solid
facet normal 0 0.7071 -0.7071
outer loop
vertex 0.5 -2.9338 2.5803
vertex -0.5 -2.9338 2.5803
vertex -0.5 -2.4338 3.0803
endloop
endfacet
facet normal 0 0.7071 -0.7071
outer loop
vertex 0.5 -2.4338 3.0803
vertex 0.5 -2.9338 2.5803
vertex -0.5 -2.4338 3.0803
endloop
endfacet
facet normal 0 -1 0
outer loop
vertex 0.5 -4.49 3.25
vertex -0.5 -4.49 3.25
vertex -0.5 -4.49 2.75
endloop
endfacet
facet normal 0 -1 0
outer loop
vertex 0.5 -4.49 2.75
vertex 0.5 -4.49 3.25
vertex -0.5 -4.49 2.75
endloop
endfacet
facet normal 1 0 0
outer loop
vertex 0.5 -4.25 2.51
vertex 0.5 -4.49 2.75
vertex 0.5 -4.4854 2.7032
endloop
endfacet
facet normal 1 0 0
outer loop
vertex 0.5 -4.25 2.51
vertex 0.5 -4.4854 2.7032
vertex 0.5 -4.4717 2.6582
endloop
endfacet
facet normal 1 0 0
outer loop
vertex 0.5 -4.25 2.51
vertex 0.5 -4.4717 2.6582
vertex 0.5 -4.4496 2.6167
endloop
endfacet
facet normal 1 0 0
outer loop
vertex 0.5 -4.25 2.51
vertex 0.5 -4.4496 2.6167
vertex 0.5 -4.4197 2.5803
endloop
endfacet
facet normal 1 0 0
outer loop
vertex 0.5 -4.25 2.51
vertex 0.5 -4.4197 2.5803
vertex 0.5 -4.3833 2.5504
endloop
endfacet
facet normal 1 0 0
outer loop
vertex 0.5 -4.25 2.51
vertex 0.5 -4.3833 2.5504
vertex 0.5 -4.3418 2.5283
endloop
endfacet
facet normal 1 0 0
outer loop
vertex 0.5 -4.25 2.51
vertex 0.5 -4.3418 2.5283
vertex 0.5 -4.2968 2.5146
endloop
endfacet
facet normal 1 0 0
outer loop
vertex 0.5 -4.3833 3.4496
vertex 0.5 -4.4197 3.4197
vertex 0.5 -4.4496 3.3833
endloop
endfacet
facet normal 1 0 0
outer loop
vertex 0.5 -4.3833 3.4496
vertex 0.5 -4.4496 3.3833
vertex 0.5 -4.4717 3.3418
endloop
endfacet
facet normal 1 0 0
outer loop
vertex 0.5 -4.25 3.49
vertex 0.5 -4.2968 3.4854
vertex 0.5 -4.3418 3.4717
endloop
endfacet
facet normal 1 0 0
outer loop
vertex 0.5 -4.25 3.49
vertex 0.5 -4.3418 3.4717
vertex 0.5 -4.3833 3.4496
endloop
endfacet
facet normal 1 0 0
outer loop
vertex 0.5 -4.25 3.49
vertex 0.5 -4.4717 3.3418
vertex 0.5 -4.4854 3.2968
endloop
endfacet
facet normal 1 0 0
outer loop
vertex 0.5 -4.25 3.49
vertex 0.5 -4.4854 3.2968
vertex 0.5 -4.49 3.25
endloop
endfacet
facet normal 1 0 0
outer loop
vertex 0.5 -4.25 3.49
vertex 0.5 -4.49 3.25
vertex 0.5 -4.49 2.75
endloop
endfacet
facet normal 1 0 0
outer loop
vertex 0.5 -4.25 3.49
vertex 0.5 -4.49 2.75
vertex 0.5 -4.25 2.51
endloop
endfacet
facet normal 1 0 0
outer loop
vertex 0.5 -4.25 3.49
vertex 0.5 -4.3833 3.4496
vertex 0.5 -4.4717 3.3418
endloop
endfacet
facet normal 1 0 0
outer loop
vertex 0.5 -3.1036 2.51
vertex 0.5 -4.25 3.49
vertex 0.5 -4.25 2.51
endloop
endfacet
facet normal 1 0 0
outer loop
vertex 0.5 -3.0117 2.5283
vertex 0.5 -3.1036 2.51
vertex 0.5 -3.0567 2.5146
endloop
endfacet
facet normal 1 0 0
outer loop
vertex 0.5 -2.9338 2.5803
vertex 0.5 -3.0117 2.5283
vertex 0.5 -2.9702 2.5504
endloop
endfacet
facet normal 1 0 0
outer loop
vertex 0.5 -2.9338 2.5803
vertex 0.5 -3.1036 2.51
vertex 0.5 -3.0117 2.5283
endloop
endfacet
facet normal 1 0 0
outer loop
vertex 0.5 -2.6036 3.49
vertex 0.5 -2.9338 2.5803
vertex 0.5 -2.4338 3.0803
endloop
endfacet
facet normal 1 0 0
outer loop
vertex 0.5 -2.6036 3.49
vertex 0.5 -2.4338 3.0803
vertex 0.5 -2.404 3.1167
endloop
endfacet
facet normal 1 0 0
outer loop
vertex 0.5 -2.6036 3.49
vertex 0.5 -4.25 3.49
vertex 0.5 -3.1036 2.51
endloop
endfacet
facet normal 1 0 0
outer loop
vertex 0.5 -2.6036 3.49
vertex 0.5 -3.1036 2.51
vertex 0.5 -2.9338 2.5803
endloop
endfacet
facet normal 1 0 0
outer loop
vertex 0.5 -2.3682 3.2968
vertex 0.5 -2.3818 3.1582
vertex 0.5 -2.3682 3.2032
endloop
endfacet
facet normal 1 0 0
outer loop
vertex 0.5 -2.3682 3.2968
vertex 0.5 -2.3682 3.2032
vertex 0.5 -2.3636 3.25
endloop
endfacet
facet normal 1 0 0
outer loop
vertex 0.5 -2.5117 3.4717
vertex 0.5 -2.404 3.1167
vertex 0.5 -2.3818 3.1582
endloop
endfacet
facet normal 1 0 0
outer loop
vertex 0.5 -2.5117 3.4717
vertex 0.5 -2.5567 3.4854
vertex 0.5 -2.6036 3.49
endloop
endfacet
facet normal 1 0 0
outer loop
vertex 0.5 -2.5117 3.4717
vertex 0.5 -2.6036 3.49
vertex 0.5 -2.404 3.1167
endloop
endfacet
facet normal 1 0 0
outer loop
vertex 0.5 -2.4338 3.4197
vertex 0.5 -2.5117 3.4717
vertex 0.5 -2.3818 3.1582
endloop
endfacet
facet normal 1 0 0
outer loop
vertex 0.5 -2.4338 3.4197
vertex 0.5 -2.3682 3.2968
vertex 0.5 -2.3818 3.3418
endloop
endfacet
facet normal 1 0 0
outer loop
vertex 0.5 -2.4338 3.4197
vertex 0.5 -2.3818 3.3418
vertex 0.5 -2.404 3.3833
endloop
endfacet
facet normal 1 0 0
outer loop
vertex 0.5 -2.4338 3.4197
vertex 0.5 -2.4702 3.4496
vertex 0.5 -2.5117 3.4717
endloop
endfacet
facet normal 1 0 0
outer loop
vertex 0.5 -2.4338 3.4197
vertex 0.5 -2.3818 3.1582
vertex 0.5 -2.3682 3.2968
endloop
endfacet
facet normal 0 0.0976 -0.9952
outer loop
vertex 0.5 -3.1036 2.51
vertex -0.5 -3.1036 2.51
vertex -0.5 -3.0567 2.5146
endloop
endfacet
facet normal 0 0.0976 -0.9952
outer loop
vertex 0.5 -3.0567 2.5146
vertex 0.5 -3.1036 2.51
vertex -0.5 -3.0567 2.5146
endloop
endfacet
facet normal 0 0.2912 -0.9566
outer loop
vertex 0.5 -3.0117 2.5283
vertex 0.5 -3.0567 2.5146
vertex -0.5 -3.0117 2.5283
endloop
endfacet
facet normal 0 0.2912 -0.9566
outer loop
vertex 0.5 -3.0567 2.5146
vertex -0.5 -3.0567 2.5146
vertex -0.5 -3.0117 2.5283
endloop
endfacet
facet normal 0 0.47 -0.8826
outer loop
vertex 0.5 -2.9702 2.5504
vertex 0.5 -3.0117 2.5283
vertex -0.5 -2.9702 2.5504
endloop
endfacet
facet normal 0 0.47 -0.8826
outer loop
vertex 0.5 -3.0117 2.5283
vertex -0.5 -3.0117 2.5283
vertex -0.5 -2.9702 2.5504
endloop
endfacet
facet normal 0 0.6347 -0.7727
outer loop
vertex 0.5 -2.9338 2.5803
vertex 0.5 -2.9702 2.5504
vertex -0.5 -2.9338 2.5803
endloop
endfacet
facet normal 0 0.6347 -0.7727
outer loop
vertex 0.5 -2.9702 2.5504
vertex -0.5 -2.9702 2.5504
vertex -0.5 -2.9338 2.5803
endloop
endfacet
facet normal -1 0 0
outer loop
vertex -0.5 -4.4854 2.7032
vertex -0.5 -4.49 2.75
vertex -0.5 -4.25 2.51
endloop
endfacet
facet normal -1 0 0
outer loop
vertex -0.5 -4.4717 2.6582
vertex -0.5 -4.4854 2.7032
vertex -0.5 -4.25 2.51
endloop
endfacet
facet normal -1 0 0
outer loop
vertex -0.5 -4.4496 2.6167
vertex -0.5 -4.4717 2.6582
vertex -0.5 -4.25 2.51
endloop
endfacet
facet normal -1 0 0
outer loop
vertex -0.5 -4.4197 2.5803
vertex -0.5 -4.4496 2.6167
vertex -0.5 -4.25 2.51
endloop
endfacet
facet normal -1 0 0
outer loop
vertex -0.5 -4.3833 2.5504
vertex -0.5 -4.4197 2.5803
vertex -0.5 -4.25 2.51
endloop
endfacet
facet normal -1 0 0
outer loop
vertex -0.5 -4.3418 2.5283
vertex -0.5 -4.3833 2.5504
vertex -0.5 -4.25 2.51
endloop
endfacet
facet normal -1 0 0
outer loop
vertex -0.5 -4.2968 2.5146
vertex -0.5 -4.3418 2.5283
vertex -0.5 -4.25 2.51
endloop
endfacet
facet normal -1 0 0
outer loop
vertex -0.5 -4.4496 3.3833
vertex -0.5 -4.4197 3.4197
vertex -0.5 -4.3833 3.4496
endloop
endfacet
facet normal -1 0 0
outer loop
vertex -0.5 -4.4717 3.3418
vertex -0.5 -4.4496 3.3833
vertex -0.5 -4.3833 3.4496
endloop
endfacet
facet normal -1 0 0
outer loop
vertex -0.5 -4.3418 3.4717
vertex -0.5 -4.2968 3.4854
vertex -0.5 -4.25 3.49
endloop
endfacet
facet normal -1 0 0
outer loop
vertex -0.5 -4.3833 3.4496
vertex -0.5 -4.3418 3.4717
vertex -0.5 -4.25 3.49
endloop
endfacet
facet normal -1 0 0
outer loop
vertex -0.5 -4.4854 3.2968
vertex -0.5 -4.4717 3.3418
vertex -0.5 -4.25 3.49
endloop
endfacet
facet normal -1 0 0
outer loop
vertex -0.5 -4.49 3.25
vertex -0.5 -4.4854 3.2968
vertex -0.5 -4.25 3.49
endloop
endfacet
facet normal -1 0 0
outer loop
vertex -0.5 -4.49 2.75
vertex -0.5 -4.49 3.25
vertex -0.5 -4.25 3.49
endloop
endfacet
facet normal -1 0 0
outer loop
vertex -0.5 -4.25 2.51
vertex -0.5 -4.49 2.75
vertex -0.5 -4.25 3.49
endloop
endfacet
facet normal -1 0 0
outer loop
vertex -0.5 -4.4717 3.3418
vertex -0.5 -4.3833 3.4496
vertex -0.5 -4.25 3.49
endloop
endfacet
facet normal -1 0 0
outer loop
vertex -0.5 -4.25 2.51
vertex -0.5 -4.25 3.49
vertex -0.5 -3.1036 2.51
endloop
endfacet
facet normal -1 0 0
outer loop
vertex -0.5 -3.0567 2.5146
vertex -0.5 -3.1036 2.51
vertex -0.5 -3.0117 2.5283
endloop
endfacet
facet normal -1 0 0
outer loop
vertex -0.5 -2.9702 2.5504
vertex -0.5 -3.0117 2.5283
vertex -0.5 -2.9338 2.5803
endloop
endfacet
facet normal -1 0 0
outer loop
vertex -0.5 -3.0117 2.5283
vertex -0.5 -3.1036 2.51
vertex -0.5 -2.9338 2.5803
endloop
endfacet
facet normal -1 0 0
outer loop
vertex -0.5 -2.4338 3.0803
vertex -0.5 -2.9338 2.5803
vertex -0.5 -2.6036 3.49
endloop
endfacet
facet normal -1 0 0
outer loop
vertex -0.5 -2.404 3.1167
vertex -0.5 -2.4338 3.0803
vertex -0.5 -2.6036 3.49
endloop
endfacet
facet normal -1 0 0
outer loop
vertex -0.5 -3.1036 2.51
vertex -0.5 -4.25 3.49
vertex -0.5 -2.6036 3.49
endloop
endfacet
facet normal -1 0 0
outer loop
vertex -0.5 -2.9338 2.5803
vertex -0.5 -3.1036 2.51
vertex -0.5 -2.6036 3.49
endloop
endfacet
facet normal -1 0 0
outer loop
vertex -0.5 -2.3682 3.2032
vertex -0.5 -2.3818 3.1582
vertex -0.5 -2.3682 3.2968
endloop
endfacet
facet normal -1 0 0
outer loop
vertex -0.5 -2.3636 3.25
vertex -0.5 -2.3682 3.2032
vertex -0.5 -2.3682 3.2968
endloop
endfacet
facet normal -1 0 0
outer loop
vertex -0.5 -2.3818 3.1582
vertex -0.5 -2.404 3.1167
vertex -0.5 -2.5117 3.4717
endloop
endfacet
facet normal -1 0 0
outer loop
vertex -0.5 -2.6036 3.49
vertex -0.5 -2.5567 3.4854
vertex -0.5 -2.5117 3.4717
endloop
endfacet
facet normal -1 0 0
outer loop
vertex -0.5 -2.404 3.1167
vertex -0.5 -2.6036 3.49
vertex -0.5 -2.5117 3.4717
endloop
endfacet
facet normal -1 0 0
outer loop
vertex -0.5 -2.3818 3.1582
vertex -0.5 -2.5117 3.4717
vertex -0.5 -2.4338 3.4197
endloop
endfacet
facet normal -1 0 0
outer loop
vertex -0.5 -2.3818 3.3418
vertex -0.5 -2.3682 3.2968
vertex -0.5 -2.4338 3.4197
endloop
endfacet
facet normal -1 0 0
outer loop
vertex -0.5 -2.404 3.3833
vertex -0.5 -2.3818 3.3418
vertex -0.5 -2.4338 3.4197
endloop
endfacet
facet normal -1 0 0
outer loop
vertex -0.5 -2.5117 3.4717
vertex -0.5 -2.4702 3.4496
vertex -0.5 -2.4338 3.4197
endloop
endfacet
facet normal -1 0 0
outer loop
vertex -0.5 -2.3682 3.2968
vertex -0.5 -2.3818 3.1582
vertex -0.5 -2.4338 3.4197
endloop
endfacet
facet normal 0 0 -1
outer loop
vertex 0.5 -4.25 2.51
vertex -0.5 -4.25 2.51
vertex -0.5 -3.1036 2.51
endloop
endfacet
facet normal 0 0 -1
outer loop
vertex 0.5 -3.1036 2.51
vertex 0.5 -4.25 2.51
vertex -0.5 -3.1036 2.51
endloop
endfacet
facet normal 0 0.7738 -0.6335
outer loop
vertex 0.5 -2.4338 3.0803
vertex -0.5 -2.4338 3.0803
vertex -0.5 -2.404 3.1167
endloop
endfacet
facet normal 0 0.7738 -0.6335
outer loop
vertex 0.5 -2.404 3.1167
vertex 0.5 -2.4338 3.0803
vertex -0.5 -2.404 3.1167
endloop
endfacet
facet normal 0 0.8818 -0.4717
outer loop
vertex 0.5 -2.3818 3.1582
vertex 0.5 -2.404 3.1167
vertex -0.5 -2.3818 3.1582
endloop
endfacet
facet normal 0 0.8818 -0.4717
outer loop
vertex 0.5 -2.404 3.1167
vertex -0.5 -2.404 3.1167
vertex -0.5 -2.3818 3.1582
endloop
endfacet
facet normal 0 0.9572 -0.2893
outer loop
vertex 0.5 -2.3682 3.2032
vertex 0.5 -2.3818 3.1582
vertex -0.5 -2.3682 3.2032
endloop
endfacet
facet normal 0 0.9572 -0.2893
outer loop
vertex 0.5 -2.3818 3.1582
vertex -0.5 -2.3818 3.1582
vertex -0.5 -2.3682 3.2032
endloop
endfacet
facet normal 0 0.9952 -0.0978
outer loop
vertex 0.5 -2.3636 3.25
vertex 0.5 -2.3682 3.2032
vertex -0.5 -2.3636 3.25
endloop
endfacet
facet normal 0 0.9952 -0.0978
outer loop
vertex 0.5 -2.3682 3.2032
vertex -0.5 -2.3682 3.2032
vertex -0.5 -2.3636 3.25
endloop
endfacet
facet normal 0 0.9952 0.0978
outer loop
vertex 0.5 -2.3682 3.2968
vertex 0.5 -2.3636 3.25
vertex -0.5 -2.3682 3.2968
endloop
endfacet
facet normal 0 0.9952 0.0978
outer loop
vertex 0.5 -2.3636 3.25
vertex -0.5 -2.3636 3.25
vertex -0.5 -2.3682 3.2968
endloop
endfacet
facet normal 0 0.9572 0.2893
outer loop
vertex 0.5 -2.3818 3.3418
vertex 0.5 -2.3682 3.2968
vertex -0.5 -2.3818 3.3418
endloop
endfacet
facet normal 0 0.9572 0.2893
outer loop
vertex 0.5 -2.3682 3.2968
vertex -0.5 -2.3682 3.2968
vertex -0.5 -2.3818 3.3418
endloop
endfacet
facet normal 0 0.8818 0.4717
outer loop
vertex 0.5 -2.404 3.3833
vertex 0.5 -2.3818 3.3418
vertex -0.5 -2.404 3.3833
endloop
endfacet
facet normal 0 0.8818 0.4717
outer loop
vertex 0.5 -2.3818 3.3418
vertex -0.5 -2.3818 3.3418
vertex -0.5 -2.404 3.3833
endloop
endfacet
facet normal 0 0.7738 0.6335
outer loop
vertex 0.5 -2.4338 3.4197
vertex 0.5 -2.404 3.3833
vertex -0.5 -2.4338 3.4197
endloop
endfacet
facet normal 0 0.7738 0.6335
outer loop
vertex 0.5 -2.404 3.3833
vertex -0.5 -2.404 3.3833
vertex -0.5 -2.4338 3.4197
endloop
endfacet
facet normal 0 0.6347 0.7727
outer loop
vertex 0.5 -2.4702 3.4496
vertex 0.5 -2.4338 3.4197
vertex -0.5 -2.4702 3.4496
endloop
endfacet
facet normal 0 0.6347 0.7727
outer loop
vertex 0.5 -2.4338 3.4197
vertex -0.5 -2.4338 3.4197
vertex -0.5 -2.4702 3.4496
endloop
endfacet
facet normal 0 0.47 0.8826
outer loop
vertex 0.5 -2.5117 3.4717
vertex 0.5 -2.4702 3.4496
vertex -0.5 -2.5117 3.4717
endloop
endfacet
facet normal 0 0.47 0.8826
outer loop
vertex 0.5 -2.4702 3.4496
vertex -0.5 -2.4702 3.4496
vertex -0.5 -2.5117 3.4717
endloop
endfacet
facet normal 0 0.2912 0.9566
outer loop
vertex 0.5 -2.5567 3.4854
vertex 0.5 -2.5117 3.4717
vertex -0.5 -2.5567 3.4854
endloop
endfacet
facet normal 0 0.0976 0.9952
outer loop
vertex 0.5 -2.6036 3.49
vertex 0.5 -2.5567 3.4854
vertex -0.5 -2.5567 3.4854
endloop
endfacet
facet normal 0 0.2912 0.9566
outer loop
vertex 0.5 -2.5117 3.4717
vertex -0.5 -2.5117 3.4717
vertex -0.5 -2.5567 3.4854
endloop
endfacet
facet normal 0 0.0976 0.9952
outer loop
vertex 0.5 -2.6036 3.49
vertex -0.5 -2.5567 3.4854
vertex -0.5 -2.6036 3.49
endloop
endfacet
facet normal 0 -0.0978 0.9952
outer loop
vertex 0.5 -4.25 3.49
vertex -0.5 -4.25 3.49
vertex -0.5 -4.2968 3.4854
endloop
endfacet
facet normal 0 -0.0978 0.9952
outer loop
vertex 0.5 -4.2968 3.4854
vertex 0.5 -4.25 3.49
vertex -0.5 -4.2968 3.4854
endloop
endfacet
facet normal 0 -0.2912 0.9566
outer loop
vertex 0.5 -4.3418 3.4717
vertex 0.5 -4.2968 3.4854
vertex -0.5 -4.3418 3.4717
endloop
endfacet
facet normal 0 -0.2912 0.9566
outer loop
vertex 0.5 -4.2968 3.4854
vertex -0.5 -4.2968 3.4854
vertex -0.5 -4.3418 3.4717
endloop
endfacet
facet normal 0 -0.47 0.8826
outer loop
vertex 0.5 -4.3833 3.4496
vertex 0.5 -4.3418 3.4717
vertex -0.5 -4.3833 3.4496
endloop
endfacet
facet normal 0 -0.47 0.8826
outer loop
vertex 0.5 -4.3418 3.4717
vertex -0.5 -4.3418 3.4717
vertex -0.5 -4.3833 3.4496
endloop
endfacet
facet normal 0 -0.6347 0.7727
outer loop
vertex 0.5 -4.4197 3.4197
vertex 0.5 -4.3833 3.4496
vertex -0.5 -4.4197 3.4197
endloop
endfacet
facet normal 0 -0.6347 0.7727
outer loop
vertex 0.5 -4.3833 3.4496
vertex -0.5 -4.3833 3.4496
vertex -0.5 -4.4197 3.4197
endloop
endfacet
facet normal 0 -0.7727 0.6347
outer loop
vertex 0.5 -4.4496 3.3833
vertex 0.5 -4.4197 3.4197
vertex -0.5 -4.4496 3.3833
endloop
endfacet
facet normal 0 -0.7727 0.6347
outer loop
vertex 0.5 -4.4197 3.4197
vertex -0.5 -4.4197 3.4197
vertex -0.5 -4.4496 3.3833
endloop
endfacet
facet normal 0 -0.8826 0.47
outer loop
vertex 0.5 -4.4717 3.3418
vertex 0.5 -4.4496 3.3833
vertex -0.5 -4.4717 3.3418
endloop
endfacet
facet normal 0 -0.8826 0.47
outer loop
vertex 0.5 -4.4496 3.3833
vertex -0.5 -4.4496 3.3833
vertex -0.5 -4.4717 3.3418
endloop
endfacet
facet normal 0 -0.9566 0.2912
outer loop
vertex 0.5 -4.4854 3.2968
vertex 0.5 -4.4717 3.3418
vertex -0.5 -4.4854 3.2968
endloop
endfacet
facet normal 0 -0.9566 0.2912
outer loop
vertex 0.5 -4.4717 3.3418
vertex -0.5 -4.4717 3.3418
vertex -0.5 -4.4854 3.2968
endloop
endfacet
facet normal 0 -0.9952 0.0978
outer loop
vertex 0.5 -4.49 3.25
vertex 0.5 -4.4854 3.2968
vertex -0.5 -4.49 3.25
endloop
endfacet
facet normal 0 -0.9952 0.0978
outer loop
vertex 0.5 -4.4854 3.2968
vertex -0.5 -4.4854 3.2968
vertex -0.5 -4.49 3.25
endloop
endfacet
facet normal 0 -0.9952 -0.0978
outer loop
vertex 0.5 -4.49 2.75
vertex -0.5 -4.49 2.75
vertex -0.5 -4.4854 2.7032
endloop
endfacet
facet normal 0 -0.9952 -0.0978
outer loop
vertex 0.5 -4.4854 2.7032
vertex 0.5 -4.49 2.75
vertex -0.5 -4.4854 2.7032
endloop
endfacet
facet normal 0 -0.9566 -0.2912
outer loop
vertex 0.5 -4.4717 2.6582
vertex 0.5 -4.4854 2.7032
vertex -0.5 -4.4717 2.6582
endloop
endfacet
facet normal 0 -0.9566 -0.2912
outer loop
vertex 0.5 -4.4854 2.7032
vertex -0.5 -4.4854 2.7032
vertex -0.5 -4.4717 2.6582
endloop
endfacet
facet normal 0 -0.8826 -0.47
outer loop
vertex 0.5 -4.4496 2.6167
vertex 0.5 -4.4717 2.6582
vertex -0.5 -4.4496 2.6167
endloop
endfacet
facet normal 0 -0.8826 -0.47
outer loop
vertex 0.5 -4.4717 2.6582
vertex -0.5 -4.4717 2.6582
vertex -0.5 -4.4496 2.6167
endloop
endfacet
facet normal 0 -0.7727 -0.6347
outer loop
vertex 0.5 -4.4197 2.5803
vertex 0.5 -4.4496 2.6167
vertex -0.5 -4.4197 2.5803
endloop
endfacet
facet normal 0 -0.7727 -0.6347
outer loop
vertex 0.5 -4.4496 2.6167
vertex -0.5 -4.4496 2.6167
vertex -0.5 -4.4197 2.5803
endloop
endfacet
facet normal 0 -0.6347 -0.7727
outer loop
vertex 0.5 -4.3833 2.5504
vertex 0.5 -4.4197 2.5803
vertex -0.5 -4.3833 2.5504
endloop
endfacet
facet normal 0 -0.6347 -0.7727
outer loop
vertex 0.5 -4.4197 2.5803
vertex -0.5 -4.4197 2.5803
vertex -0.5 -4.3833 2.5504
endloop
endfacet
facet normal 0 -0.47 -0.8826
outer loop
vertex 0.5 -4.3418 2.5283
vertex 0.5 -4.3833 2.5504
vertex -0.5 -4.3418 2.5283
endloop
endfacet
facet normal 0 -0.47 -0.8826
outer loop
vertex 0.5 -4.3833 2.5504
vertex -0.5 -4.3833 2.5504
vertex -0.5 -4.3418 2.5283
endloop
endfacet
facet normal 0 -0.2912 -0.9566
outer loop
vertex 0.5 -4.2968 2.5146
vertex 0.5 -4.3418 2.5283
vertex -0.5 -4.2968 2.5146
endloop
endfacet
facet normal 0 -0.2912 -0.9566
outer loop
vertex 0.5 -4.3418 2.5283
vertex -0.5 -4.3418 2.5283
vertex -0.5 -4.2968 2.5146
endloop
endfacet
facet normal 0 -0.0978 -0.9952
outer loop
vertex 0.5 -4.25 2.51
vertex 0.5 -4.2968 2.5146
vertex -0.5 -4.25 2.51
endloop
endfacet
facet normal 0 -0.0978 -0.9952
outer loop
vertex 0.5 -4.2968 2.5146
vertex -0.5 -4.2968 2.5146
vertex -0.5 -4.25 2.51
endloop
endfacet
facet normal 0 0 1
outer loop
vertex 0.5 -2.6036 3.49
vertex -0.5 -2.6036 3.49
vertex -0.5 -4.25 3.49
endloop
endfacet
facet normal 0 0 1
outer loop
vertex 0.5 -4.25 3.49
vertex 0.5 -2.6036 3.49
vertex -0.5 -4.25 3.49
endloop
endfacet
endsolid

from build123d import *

# Parameters (mm, degrees)
BOSS_EXTRUDE1_DEPTH      = 0.5
BOSS_EXTRUDE1_DEPTH_BACK = 0.5


with BuildPart() as part:
    # Sketch1 → Boss-Extrude1 (new, two sides: drawn at the far end of the back side and taken through both)
    with BuildSketch(Plane.YZ.offset(-BOSS_EXTRUDE1_DEPTH_BACK)):
        with BuildLine():
            Line((-4.25, 2.51), (-3.103553391, 2.51))
            ThreePointArc((-3.103553391, 2.51), (-3.011709367, 2.528268912), (-2.933847763, 2.580294373))
            Line((-2.933847763, 2.580294373), (-2.433847763, 3.080294373))
            ThreePointArc((-2.433847763, 3.080294373), (-2.381822303, 3.341844024), (-2.603553391, 3.49))
            Line((-2.603553391, 3.49), (-4.25, 3.49))
            ThreePointArc((-4.25, 3.49), (-4.419705627, 3.419705627), (-4.49, 3.25))
            Line((-4.49, 3.25), (-4.49, 2.75))
            ThreePointArc((-4.49, 2.75), (-4.419705627, 2.580294373), (-4.25, 2.51))
        make_face()
    extrude(amount=BOSS_EXTRUDE1_DEPTH + BOSS_EXTRUDE1_DEPTH_BACK)


solid = part.part
